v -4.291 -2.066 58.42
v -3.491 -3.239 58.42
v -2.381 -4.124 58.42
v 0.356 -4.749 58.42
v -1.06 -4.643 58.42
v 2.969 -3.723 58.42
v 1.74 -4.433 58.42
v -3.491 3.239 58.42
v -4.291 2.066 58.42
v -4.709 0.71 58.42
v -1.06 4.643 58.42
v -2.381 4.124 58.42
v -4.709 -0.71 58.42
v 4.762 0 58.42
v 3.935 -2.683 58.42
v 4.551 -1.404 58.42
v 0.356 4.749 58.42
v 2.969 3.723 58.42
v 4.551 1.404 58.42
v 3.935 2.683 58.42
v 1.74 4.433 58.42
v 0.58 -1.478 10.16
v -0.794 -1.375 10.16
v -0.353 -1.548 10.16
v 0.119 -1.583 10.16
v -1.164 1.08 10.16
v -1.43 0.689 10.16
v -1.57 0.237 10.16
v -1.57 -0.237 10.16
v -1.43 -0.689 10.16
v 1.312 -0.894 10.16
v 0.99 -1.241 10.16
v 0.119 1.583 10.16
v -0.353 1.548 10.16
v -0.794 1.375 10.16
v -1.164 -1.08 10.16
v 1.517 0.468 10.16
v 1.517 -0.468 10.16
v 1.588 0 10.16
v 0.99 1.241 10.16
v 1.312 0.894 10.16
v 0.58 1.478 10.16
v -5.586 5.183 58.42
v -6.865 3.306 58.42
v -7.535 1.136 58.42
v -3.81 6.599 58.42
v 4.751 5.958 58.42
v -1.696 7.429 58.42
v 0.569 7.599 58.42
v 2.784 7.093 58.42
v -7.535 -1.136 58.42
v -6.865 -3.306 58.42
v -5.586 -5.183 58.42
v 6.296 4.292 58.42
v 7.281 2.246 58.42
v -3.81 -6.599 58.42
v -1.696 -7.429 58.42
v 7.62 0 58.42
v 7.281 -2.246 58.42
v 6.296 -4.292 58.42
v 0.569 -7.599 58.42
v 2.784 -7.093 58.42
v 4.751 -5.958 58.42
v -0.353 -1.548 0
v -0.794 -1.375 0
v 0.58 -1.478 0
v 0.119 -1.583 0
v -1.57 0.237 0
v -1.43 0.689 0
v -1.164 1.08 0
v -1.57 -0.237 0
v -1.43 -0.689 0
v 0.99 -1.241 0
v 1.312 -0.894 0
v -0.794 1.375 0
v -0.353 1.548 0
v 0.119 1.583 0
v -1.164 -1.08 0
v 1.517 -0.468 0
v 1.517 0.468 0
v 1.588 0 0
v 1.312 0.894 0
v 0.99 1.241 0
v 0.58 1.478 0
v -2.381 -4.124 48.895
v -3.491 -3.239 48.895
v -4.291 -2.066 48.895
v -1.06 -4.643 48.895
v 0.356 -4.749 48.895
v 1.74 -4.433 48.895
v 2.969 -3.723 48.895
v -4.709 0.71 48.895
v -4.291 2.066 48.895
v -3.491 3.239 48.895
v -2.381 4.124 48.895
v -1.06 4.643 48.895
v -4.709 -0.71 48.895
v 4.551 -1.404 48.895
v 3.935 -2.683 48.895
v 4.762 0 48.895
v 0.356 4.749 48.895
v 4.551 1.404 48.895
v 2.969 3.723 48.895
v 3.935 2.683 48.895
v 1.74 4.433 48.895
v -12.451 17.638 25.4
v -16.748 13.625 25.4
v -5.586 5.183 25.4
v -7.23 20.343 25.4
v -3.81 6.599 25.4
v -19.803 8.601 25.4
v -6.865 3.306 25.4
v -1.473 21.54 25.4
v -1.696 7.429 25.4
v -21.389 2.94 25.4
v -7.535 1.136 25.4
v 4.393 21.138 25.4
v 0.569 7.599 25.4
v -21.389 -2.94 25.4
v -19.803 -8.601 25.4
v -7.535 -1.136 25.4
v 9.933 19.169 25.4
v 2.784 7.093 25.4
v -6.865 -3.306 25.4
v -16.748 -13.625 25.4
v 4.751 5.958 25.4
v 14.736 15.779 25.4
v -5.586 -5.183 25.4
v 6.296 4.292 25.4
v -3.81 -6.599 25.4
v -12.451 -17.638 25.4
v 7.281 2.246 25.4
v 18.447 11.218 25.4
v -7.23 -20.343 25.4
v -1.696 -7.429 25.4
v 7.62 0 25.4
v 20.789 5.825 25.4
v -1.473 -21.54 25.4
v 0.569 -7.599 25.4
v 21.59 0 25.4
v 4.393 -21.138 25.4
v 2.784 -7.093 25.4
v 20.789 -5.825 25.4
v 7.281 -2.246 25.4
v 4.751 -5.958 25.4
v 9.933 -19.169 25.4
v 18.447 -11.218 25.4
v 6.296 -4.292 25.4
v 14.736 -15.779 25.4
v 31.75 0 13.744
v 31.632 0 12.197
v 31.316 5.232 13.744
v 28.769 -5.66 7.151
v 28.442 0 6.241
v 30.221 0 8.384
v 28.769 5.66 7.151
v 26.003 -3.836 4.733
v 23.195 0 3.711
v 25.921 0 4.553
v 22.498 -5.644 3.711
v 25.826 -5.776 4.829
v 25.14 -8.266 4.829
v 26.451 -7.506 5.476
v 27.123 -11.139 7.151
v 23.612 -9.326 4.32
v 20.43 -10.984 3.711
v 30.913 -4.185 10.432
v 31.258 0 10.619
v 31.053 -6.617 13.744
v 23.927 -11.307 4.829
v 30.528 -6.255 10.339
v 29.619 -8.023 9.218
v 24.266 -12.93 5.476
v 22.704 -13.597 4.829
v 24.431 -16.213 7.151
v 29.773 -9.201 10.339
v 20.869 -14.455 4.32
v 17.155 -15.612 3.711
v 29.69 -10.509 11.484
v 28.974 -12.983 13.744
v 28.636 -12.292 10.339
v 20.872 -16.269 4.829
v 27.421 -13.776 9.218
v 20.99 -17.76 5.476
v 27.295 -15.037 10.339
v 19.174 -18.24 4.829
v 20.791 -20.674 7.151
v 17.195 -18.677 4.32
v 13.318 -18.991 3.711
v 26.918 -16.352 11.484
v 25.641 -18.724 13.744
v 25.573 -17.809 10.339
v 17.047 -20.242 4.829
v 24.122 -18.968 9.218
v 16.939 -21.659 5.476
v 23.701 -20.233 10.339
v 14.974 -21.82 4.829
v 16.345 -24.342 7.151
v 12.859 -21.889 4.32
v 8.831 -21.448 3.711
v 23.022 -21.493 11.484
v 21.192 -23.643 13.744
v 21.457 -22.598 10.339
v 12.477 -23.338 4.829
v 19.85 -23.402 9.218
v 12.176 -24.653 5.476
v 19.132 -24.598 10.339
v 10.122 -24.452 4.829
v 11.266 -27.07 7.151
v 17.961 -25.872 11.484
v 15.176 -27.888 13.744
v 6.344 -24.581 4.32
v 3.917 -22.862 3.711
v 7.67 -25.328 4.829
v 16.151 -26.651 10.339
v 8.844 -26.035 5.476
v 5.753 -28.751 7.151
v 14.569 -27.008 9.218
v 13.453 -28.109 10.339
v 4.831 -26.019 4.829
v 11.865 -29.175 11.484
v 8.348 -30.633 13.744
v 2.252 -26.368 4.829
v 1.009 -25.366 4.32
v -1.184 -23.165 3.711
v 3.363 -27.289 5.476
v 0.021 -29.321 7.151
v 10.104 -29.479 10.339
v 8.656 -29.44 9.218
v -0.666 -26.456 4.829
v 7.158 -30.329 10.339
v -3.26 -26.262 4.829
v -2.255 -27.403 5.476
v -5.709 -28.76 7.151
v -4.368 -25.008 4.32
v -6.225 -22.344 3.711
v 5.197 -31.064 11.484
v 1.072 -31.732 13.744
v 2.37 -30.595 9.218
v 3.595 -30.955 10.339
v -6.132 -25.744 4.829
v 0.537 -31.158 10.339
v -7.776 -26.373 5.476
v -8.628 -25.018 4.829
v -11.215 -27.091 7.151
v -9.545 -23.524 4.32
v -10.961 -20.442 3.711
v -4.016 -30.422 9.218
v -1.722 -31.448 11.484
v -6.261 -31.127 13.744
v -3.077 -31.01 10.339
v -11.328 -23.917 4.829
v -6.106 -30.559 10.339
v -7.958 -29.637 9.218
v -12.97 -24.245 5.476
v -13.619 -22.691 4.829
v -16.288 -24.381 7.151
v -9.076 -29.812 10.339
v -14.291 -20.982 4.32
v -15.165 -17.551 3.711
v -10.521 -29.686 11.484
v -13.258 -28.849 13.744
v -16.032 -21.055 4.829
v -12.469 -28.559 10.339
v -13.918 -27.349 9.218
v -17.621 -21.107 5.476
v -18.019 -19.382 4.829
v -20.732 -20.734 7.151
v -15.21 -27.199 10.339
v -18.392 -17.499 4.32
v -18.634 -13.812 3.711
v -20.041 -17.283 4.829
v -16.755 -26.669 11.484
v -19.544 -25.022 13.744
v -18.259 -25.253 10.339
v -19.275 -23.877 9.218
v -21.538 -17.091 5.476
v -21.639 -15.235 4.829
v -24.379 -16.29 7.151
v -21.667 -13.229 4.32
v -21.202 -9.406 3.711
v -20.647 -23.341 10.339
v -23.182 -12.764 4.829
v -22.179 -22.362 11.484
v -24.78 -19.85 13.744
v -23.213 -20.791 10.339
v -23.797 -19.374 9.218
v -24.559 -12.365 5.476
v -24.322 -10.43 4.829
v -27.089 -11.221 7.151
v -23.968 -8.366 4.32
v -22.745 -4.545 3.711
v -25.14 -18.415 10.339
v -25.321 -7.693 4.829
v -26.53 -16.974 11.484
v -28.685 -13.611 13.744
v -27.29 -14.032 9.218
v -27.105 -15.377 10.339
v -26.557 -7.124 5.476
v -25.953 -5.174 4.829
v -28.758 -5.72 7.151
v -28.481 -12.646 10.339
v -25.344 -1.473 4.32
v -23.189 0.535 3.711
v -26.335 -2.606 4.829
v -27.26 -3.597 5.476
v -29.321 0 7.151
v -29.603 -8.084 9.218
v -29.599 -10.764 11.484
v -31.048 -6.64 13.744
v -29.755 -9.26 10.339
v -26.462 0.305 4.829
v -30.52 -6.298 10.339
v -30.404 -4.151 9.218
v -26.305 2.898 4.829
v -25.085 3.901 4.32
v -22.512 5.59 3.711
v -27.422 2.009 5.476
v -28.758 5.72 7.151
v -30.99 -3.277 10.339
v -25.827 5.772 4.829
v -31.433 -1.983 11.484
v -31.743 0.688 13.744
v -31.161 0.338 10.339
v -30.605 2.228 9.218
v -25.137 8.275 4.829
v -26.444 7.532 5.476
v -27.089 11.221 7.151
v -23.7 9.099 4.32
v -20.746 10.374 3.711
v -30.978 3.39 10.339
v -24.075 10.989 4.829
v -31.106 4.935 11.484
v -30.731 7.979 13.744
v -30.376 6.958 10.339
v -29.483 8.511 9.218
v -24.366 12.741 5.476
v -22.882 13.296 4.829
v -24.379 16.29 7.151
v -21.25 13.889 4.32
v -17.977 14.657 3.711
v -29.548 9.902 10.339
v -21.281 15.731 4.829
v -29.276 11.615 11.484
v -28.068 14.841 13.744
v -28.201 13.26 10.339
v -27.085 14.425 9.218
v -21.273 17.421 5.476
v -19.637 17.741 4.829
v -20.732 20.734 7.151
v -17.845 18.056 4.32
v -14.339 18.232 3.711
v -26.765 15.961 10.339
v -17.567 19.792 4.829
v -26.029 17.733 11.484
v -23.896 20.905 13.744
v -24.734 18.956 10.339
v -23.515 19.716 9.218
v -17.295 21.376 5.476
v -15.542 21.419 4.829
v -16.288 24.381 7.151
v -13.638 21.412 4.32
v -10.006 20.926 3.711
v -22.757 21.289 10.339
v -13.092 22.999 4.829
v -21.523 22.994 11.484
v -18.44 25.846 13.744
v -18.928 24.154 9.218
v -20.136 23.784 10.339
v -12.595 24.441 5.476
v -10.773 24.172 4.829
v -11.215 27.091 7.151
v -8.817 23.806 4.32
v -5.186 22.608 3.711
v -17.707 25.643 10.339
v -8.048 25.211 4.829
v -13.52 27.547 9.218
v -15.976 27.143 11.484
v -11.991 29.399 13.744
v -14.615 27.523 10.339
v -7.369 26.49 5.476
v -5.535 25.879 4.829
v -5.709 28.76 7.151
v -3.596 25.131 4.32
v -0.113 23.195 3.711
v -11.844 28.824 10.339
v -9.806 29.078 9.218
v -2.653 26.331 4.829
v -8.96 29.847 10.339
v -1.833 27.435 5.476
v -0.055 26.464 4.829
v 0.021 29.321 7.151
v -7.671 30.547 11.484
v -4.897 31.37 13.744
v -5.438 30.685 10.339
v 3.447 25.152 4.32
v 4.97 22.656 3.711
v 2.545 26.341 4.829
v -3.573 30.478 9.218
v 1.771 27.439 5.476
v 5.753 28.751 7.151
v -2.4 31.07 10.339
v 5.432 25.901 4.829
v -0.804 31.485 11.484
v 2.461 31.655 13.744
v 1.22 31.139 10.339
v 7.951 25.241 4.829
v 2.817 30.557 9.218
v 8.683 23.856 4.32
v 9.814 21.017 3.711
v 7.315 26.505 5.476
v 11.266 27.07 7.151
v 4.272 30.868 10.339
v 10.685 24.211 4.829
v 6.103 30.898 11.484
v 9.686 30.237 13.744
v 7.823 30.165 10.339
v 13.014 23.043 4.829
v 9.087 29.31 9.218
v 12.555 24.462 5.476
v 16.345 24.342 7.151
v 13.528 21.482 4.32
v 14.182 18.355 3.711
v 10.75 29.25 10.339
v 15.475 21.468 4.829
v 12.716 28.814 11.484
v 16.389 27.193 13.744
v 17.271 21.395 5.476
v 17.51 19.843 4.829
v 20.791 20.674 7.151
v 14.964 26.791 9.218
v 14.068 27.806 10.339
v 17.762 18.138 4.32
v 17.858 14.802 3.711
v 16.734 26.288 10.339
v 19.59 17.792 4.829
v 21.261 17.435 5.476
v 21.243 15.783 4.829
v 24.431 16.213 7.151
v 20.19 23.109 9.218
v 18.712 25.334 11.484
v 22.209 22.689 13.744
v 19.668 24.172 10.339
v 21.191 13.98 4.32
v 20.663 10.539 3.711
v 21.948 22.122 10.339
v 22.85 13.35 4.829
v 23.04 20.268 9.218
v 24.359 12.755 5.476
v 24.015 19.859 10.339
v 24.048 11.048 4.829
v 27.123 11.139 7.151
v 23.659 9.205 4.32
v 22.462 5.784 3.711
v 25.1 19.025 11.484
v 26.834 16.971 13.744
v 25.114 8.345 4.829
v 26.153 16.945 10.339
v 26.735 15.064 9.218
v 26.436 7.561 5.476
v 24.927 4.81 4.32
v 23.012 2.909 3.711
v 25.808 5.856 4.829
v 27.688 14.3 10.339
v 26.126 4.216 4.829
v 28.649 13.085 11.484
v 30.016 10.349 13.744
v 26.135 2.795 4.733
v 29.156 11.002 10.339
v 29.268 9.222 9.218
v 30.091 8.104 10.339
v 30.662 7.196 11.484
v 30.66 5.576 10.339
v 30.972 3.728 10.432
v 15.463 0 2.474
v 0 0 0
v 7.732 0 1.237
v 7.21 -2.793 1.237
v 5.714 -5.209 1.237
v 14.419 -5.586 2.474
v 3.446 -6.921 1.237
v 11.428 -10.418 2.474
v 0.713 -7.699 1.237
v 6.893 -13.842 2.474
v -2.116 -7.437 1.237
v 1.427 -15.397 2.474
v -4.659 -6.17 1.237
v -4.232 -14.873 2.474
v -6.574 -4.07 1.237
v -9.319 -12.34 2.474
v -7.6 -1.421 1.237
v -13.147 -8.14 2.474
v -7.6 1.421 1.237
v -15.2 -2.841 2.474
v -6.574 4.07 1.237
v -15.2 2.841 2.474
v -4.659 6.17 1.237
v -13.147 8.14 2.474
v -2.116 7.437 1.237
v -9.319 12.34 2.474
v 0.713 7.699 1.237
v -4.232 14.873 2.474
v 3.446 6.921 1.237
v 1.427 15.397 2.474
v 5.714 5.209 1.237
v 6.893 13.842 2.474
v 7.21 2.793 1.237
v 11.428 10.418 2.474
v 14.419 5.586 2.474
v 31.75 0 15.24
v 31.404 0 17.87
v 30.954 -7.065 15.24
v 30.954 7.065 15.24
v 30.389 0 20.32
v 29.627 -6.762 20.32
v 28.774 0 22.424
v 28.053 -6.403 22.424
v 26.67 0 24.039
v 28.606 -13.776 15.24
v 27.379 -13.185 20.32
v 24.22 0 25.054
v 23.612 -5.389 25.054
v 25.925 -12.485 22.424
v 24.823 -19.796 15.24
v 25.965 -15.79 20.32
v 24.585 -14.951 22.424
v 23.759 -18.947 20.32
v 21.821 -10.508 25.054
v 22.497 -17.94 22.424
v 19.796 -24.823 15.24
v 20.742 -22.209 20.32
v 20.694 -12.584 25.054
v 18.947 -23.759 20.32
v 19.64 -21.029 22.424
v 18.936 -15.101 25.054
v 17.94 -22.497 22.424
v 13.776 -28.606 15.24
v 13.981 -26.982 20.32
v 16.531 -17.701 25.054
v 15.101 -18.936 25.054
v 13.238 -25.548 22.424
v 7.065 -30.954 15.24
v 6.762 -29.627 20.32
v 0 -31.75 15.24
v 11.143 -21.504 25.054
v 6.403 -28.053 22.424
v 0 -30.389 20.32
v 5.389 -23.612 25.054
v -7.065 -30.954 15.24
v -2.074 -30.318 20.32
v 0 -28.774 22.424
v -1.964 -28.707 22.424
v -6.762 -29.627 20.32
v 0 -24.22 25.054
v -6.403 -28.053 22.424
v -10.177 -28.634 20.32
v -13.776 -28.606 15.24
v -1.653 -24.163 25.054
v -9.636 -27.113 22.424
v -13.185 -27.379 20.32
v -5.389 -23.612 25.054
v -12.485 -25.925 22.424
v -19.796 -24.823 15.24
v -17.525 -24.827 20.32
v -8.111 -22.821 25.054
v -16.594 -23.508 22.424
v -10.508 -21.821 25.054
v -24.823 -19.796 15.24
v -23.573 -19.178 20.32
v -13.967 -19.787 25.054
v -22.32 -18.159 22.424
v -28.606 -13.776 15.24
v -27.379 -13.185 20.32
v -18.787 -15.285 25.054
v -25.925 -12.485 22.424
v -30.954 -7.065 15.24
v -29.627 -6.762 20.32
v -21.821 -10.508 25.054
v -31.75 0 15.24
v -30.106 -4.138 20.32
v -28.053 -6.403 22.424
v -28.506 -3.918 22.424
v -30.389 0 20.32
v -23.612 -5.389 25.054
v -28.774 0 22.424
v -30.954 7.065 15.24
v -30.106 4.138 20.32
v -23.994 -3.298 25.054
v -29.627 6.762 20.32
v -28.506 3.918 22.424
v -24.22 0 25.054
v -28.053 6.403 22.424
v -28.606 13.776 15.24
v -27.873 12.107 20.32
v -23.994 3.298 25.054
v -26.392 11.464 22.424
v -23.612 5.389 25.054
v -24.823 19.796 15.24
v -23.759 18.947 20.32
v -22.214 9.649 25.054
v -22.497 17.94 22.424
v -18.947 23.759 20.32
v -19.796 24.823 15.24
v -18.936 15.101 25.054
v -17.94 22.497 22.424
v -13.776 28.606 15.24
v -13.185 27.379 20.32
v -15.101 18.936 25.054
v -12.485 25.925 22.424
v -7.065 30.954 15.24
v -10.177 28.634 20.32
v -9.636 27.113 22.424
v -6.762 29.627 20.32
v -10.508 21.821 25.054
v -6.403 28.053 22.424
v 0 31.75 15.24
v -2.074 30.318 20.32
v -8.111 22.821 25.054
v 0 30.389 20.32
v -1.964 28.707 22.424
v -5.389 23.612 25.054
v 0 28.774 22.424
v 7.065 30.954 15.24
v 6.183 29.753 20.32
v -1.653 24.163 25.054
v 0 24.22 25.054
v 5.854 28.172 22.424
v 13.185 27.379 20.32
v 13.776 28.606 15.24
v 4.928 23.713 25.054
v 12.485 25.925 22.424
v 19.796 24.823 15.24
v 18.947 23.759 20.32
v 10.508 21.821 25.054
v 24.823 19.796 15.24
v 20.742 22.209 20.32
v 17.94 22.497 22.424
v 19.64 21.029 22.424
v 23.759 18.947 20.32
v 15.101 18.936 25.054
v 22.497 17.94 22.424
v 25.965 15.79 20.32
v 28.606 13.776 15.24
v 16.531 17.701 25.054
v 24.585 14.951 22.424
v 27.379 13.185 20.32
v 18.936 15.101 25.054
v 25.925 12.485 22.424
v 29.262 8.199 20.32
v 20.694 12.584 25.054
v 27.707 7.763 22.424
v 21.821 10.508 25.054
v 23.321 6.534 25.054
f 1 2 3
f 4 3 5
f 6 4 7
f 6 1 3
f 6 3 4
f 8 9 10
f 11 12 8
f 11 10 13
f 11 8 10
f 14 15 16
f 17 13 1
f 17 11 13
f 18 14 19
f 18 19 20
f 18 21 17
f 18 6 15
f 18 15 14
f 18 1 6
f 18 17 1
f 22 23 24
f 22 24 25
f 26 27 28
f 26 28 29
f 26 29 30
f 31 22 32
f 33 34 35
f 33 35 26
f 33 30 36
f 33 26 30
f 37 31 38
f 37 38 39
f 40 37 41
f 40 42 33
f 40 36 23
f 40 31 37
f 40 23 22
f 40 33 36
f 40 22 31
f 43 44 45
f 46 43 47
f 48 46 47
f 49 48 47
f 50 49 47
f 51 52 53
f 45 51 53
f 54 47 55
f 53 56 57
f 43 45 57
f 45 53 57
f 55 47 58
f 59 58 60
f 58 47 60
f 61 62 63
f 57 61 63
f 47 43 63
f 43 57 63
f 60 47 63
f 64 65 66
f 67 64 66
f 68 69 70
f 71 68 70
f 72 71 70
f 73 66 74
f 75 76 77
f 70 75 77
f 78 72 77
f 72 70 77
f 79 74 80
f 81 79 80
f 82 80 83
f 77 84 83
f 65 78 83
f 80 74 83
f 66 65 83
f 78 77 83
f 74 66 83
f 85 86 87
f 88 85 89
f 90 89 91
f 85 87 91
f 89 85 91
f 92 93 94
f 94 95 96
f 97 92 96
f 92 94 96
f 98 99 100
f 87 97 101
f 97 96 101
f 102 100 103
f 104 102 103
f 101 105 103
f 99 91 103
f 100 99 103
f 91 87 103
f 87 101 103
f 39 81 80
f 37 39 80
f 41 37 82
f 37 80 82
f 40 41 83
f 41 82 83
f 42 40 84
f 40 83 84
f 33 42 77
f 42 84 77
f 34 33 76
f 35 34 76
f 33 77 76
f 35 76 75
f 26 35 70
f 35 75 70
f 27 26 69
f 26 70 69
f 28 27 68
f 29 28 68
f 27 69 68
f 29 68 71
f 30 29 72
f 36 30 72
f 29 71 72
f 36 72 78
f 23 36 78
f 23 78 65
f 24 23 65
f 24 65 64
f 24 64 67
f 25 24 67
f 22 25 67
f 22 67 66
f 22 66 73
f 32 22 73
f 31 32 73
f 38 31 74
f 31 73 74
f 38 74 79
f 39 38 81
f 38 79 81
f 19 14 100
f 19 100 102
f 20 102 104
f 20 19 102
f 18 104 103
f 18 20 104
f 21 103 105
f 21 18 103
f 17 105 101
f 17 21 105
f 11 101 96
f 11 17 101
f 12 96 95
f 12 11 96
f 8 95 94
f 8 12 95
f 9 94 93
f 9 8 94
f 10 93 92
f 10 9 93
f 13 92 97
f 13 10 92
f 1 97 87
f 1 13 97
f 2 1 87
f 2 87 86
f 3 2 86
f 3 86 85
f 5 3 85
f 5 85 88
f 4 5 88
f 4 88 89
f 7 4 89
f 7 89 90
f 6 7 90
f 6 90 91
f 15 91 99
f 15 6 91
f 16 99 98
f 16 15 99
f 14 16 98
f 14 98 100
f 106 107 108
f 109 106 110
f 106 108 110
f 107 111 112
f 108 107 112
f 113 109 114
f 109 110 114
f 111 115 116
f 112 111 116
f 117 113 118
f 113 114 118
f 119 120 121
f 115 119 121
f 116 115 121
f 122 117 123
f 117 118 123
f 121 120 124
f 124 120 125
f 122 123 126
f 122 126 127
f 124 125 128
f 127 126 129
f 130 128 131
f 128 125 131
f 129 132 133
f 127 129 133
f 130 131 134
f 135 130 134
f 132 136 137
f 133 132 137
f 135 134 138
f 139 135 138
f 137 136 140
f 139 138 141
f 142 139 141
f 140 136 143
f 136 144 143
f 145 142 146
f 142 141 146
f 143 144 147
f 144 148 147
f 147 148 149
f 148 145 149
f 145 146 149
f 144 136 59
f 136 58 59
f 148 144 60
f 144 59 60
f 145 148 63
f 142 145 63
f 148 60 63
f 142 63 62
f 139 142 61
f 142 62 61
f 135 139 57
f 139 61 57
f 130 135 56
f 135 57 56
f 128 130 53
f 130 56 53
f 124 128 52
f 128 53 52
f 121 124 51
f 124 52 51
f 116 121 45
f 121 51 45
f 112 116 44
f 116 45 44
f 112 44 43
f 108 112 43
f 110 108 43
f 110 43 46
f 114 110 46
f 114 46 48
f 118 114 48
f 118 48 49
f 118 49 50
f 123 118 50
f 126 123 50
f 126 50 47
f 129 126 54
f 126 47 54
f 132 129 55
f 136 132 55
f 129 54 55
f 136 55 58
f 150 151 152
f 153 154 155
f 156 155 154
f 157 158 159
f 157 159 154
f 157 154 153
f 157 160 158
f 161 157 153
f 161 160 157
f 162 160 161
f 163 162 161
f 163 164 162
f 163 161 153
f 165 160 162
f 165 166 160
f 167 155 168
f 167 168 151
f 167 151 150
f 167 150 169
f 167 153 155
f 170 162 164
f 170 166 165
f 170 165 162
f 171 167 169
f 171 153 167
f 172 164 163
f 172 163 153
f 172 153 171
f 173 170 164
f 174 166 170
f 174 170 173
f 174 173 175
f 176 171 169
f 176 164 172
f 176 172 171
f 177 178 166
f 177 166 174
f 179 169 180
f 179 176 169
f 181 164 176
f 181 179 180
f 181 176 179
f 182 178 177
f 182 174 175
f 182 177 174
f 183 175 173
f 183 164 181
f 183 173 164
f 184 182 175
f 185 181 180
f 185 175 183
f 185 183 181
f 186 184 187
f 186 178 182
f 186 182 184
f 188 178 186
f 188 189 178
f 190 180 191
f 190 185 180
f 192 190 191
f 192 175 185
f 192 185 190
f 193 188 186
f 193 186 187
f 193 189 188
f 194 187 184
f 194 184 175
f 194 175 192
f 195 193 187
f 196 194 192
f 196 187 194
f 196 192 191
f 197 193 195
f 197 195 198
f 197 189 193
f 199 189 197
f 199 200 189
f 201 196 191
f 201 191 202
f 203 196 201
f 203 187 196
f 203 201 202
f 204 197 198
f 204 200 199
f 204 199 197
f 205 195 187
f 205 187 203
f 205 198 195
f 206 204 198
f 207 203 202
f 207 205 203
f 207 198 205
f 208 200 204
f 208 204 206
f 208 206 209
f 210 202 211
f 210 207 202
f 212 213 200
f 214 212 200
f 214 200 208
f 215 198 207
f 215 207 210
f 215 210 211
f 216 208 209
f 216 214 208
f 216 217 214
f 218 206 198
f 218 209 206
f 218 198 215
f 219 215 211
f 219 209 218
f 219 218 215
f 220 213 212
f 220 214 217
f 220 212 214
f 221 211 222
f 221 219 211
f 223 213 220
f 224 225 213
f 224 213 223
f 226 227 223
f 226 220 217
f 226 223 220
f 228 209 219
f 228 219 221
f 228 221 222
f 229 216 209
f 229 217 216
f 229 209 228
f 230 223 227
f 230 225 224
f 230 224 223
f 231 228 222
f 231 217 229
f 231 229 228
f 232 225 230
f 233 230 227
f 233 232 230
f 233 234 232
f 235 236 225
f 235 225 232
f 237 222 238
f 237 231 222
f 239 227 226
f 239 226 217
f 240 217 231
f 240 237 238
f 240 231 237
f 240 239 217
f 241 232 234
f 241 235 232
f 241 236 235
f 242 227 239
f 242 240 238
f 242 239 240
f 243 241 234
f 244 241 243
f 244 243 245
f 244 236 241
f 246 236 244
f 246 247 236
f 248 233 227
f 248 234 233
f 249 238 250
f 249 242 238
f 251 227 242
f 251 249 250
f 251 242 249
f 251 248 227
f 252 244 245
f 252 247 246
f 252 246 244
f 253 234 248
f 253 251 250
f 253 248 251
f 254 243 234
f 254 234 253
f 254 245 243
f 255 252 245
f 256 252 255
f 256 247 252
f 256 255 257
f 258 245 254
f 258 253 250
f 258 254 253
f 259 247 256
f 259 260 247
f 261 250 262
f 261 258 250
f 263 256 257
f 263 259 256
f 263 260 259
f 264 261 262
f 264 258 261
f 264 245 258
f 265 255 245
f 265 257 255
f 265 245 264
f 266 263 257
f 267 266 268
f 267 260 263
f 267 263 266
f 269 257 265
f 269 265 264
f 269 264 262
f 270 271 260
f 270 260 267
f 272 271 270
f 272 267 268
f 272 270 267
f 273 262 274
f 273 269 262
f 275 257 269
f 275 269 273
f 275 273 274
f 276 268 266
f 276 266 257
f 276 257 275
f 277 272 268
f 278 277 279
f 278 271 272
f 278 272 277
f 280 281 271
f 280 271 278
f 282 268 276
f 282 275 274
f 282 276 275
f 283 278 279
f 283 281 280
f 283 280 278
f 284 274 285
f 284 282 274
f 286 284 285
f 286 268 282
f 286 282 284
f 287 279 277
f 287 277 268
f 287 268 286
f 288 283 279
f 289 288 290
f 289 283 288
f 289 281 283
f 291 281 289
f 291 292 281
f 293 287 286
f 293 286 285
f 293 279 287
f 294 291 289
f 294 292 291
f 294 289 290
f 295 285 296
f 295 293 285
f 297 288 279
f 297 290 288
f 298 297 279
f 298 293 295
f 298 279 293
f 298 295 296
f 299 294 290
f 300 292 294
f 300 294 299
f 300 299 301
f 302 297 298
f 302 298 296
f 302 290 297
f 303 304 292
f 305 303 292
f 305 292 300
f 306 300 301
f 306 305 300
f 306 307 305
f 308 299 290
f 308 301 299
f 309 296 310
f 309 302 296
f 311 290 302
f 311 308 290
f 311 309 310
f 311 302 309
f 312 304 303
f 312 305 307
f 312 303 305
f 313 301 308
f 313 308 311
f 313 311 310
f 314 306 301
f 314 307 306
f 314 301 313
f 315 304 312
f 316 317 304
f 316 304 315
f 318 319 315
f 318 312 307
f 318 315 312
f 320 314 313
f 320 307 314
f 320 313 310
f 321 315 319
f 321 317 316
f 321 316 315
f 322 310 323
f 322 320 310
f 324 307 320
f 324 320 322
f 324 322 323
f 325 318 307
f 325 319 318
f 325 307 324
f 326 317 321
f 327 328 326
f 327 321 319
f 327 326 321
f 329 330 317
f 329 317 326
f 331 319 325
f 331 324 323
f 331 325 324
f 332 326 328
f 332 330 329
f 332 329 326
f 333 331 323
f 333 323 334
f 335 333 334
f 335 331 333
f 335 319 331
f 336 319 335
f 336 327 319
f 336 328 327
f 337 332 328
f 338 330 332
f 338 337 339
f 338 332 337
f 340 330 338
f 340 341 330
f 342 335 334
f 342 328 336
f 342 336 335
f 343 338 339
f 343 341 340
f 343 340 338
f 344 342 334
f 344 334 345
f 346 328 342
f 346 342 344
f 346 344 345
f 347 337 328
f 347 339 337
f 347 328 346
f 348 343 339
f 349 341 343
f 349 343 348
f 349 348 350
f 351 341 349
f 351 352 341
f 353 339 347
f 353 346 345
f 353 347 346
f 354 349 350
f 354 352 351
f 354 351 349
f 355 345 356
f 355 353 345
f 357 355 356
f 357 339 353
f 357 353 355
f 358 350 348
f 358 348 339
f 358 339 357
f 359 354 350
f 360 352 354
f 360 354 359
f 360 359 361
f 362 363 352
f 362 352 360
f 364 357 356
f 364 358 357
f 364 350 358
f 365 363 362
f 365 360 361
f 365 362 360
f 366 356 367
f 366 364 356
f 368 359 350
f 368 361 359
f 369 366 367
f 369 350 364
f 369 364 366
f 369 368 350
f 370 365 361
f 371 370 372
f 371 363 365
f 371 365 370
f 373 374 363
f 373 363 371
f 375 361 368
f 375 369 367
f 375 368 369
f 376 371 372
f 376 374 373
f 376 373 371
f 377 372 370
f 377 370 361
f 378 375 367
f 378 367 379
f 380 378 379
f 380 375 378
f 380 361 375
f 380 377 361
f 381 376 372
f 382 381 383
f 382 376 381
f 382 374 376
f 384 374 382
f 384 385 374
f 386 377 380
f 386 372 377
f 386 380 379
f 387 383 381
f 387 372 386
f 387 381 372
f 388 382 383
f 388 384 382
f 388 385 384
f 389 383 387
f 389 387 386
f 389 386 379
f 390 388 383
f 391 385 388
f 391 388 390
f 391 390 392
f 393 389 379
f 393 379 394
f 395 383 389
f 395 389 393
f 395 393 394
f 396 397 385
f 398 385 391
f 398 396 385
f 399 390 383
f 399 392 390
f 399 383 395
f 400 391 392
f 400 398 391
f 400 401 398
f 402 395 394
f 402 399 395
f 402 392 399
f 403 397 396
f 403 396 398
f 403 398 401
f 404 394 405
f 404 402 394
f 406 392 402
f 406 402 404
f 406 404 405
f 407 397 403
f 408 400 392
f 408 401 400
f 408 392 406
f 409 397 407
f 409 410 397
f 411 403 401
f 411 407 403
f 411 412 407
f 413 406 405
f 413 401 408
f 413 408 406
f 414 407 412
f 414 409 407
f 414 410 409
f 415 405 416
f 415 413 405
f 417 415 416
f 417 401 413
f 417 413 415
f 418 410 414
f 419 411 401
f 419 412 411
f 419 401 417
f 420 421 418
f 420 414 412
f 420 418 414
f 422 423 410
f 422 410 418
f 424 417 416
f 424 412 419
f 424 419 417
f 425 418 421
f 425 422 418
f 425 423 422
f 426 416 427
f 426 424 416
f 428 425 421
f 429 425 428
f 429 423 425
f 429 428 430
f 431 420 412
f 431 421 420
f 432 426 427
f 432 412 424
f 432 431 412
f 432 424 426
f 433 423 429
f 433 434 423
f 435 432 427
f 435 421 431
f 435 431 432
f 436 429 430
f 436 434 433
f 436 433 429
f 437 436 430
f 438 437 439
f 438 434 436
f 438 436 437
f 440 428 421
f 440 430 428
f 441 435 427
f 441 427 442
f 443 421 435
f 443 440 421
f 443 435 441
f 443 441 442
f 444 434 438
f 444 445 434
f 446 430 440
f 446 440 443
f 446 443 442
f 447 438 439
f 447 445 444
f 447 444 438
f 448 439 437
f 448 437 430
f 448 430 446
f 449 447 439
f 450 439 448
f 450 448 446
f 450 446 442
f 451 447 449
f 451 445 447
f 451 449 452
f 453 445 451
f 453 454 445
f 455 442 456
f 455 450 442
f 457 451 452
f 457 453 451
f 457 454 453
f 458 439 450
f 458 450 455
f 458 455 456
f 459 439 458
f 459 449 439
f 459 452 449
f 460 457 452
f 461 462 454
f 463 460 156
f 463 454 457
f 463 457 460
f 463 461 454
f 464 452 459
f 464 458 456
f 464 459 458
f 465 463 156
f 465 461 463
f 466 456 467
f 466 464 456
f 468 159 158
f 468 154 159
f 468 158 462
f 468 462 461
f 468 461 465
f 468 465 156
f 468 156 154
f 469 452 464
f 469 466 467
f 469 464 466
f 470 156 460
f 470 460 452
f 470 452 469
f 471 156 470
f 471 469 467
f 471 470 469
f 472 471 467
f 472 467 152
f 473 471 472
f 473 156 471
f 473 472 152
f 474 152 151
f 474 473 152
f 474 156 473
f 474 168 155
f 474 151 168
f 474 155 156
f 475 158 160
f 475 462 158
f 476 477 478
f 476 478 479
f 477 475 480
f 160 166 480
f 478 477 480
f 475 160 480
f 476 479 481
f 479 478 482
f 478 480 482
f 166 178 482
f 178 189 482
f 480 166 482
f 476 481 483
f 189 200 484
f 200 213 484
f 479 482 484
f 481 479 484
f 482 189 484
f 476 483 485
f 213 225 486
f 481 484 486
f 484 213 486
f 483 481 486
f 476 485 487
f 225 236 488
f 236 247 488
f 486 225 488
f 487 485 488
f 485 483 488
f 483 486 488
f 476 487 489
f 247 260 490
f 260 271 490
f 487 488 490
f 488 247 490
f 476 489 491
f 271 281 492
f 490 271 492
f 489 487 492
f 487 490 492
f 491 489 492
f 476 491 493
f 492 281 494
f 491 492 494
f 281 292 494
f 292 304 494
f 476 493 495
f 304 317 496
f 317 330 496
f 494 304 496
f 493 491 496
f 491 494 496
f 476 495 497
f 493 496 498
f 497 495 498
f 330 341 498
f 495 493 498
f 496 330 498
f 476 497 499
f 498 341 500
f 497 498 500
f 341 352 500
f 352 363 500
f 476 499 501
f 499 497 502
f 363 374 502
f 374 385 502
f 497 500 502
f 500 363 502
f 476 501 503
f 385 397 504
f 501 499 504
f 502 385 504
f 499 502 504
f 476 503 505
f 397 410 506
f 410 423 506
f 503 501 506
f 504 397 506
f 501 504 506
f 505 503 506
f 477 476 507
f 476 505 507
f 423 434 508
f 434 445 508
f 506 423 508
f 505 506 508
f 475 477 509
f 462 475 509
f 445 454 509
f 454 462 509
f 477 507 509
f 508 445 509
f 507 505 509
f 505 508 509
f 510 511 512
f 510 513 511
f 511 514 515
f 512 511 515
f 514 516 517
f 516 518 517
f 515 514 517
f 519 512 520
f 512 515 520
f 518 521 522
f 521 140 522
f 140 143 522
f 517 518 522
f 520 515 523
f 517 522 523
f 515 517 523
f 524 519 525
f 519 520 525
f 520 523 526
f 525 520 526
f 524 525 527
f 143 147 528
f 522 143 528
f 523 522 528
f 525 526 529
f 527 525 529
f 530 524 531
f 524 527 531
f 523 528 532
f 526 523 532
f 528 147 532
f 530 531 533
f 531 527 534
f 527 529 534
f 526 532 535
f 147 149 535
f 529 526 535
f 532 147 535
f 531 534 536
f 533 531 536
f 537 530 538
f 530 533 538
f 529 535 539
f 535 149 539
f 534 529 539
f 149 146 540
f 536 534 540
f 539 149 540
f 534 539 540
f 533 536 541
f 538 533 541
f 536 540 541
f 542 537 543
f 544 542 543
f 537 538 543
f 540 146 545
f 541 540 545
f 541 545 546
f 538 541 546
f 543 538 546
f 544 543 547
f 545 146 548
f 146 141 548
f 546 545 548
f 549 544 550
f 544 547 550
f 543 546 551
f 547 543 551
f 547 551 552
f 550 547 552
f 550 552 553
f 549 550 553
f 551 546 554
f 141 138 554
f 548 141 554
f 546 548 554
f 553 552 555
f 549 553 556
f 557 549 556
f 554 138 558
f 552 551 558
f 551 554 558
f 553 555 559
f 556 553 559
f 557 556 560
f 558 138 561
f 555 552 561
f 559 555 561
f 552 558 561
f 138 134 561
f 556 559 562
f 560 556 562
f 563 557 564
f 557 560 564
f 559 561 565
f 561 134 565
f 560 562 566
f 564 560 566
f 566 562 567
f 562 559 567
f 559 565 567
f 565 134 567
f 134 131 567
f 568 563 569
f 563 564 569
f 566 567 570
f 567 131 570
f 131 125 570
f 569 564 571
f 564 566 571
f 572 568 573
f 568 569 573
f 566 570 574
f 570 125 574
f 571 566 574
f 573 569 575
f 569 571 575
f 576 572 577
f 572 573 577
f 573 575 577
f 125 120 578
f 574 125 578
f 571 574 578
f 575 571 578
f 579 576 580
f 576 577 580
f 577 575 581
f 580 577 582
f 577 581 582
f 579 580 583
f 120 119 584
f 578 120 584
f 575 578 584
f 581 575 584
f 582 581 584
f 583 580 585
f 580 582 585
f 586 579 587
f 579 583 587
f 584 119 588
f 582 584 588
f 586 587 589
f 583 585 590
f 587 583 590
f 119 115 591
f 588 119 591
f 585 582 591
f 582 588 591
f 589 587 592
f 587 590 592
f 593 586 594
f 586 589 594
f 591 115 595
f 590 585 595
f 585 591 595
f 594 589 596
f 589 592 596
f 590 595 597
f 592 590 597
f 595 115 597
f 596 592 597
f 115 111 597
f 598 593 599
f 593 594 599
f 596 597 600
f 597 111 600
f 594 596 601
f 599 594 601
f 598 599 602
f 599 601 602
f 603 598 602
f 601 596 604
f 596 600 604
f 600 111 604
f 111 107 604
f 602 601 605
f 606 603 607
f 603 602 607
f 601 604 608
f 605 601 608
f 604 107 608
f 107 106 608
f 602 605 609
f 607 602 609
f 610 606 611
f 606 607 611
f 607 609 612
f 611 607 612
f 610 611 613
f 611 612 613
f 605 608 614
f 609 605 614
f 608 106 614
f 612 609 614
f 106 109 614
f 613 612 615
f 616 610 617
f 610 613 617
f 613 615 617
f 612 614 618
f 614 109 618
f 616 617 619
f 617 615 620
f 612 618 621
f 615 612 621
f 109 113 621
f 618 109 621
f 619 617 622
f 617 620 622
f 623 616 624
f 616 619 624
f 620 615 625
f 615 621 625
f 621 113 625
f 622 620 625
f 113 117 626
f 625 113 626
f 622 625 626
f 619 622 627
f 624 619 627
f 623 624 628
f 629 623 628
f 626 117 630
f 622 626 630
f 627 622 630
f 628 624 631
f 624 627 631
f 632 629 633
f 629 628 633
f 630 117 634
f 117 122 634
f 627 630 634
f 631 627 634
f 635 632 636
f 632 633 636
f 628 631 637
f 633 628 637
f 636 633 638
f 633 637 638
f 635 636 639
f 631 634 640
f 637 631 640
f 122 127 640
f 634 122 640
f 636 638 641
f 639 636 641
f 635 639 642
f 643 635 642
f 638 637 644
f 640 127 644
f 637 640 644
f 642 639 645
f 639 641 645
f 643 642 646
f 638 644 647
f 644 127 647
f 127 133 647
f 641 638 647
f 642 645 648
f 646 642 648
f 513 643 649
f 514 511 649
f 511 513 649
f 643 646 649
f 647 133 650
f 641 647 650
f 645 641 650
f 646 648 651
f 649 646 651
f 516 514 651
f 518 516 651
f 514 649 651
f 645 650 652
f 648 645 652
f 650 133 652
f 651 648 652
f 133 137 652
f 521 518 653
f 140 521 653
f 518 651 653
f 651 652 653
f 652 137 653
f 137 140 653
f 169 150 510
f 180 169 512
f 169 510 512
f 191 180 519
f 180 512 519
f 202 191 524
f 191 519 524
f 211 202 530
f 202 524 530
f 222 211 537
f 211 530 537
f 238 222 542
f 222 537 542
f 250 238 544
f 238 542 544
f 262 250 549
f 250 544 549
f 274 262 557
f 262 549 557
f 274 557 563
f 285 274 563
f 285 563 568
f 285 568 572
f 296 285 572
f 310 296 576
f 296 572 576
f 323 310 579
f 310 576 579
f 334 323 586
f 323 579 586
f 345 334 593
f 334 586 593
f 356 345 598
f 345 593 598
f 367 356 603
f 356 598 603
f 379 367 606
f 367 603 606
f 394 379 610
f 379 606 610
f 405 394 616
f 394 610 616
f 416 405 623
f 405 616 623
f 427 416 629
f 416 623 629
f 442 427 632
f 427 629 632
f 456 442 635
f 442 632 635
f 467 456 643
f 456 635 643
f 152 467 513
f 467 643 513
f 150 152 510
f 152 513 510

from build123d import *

# Parameters (mm, degrees)
F2_R     = 10.16
F3_R     = 1.5875
F4_DEPTH = 10.16
F5_R     = 4.7625
F6_DEPTH = 9.525


with BuildPart() as f1:
    # F0 (on Front) → F1 (revolve)
    with BuildSketch(Plane.XZ):
        Polygon((0, 58.42), (0, 0), (31.75, 5.08), (31.75, 25.4), (7.62, 25.4), (7.62, 58.42), align=None)
    revolve(axis=Axis((0, 0, 29.21), (0, 0, -1)))

    # F2
    f2_edges = [f1.edges().sort_by_distance(p)[0] for p in [
        (-31.75, 0, 5.08),
        (-31.75, 0, 25.4),
        (31.75, 0, 15.24),
    ]]
    fillet(f2_edges, radius=F2_R)


with BuildPart() as f4:
    # F3 (on Top) → F4 (new body)
    with BuildSketch(Plane.XY):
        Circle(F3_R)
    extrude(amount=F4_DEPTH)


with BuildPart() as f6:
    # F5 (on face) → F6 (new body)
    with BuildSketch(Plane.XY.offset(58.42)):
        Circle(F5_R)
    extrude(amount=-F6_DEPTH)


solid = Compound([f1.part, f4.part, f6.part])
